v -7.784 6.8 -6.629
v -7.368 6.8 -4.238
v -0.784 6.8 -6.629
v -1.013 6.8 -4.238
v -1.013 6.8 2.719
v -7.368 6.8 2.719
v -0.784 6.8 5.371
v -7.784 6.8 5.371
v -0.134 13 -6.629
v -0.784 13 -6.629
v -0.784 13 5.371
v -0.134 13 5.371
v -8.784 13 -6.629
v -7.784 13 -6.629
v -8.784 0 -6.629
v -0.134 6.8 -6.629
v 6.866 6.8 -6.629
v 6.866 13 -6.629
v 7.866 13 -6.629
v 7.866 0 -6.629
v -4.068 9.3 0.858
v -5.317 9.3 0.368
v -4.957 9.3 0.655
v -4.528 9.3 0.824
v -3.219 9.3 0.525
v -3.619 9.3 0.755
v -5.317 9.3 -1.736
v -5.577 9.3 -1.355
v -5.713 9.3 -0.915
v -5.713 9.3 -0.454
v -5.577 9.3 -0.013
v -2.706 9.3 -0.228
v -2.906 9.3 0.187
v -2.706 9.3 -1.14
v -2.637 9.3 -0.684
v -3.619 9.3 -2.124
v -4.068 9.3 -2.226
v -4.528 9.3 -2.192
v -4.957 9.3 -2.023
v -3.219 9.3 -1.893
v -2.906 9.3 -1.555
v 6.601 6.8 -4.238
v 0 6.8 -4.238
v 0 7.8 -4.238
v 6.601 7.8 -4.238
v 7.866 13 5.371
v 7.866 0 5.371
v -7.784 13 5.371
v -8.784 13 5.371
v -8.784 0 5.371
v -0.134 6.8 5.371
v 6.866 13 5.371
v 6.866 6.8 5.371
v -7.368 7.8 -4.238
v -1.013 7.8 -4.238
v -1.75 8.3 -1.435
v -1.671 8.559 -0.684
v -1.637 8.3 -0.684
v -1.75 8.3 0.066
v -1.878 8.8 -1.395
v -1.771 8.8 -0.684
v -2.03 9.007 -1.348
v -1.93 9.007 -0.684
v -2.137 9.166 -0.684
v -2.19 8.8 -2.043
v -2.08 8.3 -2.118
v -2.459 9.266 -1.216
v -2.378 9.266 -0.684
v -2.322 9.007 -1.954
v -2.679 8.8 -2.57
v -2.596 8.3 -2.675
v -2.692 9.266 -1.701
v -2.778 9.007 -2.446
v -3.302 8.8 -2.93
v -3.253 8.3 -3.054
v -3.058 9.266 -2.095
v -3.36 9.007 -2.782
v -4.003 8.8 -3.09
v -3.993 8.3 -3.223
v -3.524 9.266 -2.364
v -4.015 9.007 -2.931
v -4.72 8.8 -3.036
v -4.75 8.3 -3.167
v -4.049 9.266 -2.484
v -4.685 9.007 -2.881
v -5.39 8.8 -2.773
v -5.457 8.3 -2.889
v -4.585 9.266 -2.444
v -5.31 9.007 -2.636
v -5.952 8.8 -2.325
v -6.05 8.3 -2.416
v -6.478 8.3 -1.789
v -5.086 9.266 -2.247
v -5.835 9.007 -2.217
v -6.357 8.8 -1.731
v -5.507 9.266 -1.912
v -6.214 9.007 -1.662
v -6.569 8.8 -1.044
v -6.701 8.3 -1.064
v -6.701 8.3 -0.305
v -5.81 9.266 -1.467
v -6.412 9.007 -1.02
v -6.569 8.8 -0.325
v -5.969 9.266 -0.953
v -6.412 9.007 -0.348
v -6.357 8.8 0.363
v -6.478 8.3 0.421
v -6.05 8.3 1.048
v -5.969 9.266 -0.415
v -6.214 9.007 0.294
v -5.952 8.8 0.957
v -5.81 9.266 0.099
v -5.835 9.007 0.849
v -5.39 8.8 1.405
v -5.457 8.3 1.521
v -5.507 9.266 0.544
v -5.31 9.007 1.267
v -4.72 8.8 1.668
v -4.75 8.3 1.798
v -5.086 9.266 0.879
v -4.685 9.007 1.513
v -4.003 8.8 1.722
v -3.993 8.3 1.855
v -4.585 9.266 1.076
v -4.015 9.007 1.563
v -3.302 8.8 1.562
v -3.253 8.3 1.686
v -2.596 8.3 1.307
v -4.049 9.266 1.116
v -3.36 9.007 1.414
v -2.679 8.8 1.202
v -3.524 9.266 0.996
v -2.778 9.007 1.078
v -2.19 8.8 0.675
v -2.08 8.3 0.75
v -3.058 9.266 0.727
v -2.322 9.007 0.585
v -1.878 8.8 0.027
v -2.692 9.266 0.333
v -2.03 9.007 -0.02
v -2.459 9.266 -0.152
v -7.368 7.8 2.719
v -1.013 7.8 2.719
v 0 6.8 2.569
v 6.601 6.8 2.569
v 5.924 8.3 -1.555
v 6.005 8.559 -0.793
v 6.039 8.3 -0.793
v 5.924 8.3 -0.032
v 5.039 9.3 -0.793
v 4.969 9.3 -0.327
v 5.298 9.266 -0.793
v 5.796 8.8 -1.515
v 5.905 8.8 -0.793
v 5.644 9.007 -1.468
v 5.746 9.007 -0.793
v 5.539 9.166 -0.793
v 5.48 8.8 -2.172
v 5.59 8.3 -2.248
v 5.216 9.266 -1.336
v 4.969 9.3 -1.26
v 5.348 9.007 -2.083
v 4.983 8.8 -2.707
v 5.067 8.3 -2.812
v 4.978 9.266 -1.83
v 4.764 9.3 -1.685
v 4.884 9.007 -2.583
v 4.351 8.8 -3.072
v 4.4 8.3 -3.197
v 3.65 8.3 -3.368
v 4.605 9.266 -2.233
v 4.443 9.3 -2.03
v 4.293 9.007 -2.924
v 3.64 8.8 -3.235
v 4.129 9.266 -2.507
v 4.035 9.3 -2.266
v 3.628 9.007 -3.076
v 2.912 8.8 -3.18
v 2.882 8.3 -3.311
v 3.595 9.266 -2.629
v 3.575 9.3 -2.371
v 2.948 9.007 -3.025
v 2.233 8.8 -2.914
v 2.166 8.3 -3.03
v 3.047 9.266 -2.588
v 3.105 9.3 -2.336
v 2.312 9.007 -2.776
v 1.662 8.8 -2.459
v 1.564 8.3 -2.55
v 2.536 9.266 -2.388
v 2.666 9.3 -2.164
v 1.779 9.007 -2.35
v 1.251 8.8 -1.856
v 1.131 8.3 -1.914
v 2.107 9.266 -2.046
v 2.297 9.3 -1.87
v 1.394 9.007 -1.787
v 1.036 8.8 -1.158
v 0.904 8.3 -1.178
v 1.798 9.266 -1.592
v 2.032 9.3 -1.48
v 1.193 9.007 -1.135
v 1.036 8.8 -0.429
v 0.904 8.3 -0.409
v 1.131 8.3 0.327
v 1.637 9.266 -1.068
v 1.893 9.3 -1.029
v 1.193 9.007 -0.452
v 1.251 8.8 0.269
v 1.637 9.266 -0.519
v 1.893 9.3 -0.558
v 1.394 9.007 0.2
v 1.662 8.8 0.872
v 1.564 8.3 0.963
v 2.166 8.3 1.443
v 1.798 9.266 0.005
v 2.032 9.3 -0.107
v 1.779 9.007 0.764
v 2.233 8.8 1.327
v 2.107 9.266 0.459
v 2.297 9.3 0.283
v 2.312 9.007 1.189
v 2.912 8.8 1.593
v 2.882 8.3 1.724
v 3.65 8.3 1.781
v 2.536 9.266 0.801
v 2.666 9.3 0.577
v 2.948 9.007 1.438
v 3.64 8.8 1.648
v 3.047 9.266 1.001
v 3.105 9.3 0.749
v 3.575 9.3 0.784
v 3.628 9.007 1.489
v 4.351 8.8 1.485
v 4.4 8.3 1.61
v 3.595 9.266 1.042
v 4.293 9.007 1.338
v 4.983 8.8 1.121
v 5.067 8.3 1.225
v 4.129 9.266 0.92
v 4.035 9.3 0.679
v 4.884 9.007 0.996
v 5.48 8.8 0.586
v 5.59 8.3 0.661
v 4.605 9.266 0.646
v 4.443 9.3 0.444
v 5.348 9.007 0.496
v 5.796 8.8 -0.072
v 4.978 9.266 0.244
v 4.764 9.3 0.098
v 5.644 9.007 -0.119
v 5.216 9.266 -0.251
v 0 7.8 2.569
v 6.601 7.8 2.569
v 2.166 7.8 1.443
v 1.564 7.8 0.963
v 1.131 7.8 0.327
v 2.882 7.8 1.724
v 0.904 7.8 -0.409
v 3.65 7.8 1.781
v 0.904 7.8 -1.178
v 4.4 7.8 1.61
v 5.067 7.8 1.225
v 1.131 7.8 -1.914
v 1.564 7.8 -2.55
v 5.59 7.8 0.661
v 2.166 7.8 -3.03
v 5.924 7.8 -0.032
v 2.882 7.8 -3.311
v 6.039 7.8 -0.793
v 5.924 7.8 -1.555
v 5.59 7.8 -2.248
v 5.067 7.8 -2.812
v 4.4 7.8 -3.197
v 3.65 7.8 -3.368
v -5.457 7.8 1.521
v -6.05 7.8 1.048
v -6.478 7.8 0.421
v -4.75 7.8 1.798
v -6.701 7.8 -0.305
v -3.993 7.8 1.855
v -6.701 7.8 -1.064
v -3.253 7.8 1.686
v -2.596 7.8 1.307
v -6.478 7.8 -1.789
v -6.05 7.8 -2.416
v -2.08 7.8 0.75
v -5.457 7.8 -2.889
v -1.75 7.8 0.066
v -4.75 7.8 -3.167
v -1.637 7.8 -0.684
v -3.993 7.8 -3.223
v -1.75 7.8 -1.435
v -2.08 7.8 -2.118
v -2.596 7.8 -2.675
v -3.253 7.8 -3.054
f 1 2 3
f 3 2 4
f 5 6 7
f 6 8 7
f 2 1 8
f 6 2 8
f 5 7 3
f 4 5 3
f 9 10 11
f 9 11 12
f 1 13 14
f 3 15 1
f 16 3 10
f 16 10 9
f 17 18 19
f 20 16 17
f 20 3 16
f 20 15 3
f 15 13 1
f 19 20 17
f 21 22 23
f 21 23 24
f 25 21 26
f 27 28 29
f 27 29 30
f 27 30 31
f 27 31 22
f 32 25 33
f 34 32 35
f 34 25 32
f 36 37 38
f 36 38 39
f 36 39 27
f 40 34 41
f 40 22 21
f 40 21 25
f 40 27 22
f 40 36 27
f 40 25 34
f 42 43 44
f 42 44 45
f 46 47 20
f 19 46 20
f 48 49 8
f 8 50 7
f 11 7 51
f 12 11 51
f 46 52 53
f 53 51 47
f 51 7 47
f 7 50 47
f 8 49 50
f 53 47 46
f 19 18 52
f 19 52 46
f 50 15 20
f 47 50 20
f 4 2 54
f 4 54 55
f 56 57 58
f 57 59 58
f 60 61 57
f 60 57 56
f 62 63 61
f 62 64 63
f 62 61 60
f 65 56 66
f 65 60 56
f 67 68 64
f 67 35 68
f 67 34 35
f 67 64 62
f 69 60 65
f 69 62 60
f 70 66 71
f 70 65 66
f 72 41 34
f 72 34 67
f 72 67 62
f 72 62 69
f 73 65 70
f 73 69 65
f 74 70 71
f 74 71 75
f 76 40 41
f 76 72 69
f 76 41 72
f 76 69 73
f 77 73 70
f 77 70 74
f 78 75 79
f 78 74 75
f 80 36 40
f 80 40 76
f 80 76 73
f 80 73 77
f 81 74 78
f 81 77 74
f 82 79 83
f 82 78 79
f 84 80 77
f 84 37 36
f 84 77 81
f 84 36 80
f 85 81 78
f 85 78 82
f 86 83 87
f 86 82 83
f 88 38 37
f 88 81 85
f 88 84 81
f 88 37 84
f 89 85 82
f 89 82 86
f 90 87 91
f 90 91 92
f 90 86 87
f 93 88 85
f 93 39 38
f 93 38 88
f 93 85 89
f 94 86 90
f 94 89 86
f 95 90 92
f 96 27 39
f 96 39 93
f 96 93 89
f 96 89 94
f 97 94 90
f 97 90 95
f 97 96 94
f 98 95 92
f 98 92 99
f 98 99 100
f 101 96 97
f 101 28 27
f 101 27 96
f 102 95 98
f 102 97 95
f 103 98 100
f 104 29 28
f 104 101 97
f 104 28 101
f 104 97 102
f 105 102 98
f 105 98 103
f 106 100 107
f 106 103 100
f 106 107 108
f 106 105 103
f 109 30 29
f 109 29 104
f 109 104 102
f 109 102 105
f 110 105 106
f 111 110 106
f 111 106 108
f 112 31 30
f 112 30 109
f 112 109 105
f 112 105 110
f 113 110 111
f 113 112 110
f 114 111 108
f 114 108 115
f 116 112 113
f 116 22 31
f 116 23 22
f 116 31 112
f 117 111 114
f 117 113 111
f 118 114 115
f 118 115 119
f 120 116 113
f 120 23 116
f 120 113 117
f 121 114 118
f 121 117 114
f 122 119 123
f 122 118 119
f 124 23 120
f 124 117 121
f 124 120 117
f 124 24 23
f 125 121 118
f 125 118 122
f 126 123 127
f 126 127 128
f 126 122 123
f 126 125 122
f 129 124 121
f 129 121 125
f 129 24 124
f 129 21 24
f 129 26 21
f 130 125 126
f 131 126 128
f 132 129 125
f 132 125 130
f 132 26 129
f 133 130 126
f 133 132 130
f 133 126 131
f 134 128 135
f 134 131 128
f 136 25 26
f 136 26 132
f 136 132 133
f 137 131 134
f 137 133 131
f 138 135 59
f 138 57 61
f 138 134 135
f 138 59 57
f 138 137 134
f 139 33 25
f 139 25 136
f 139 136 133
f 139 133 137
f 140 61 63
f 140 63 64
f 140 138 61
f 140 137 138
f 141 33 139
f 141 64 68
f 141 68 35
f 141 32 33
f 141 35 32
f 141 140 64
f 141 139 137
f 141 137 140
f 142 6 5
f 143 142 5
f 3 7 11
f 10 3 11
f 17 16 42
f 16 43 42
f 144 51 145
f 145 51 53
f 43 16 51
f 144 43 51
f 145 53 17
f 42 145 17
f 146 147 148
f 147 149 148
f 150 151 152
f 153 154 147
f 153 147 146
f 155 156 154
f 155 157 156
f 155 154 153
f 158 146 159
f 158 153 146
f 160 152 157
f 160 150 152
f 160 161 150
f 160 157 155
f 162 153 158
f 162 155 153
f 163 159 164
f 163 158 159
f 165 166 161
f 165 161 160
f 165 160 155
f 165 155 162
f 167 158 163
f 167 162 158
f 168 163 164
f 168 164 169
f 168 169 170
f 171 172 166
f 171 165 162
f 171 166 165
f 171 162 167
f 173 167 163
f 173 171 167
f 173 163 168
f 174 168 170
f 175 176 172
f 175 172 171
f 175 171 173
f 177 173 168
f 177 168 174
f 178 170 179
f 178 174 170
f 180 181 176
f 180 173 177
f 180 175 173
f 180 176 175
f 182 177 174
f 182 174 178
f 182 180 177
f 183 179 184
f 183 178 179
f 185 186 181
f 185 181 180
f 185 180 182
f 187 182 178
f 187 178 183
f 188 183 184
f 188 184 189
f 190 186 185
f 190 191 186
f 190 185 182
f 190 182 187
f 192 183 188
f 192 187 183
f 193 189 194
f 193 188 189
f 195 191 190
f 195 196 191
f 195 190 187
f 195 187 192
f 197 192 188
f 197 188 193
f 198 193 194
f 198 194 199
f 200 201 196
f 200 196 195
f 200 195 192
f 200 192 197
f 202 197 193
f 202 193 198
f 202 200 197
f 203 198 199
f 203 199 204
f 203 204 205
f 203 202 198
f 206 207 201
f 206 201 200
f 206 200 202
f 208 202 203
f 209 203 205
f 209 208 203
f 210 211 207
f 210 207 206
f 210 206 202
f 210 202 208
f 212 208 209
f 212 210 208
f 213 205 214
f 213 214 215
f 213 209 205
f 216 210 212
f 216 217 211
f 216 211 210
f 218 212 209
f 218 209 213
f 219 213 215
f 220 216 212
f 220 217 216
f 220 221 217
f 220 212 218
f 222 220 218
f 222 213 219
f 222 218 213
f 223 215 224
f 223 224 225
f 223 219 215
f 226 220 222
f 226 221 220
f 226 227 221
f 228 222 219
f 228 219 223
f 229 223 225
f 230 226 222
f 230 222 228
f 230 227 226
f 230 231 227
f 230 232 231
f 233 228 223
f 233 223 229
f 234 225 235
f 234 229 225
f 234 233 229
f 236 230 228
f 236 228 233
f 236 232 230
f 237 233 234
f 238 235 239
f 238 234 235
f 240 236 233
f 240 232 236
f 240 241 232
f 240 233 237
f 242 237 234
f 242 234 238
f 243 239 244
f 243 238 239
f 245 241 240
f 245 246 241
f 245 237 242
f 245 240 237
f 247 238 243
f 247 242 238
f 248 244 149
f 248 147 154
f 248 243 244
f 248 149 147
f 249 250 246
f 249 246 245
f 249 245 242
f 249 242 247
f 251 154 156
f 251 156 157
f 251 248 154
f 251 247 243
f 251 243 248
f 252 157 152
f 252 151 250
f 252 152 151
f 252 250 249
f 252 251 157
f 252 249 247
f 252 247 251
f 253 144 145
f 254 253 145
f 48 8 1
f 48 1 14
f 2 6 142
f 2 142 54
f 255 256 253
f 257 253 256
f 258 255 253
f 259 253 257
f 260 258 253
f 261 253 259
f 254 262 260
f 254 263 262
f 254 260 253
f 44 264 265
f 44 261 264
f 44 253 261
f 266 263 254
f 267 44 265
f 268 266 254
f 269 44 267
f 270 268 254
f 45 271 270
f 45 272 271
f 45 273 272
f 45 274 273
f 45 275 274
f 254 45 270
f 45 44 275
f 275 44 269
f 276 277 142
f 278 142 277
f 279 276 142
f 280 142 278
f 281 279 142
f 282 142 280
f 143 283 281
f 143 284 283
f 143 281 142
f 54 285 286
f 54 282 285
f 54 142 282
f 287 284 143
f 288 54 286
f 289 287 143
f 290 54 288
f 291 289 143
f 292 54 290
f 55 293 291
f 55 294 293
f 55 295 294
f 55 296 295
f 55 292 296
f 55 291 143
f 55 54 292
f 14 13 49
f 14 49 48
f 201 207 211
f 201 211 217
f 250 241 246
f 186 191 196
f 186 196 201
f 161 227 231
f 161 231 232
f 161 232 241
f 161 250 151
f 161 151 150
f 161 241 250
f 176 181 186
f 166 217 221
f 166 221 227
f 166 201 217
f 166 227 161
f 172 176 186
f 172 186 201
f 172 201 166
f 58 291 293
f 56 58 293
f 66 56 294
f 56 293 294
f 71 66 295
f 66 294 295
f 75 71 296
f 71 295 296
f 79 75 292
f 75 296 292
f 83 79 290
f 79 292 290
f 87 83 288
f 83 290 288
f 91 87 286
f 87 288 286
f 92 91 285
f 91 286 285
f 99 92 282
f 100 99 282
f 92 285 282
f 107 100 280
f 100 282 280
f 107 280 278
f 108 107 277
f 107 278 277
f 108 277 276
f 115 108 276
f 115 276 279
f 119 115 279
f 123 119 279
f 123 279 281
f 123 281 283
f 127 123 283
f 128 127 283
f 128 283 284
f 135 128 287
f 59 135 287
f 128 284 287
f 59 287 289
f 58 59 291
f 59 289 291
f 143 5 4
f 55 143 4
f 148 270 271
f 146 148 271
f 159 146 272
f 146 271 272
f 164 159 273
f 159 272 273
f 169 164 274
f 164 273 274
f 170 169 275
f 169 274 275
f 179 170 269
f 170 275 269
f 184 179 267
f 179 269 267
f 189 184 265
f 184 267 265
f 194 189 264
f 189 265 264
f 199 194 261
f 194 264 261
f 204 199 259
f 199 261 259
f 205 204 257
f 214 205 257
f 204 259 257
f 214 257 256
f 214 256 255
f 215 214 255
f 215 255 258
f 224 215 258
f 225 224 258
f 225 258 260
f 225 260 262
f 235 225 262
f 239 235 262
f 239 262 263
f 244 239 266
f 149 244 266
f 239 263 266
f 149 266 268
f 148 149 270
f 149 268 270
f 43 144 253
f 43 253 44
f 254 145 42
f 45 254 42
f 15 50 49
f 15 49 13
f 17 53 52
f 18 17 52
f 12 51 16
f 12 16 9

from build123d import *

# Parameters (mm, degrees)
SKETCH1_W           = 16.65
SKETCH1_H           = 12
BOSS_EXTRUDE1_DEPTH = 13
SKETCH2_W           = 7
SKETCH2_H           = 10.524951481
CUT_EXTRUDE1_DEPTH  = 13
SKETCH3_W           = 6.35563947
SKETCH3_H           = 6.957033312
SKETCH3_W_2         = 6.600584973
SKETCH3_H_2         = 6.806684851
BOSS_EXTRUDE2_DEPTH = 1
SKETCH4_R           = 2.546367572
SKETCH4_R_2         = 2.582102571
BOSS_EXTRUDE3_DEPTH = 1.5
FILLET1_R           = 1


with BuildPart() as part:
    # Sketch1 → Boss-Extrude1 (new body)
    with BuildSketch(Plane(origin=(0, 0, 0), x_dir=(1, 0, 0), z_dir=(0, 1, 0))):
        with Locations((-0.458958652, 0.629402757)):
            Rectangle(SKETCH1_W, SKETCH1_H)
    extrude(amount=BOSS_EXTRUDE1_DEPTH)

    # Sketch2 → Cut-Extrude1 (cut)
    with BuildSketch(Plane.XY.offset(5.370597243)):
        with Locations((-4.283958652, 12.062475741)):
            Rectangle(SKETCH2_W, SKETCH2_H)
        with Locations((3.366041348, 12.062475741)):
            Rectangle(SKETCH2_W, SKETCH2_H)
    extrude(amount=-CUT_EXTRUDE1_DEPTH, mode=Mode.SUBTRACT)

    # Sketch3 → Boss-Extrude2 (add)
    with BuildSketch(Plane(origin=(0, 6.8, 0), x_dir=(1, 0, 0), z_dir=(0, 1, 0))):
        with Locations((-4.190334083, 0.759249154)):
            Rectangle(SKETCH3_W, SKETCH3_H)
        with Locations((3.300292487, 0.834423384)):
            Rectangle(SKETCH3_W_2, SKETCH3_H_2)
    extrude(amount=BOSS_EXTRUDE2_DEPTH)

    # Sketch4 → Boss-Extrude3 (add)
    with BuildSketch(Plane(origin=(0, 7.8, 0), x_dir=(1, 0, 0), z_dir=(0, 1, 0))):
        with Locations((-4.183500062, 0.684074924)):
            Circle(SKETCH4_R)
        with Locations((3.456935343, 0.793419259)):
            Circle(SKETCH4_R_2)
    extrude(amount=BOSS_EXTRUDE3_DEPTH)

    # Fillet1
    fillet1_edges = [part.edges().sort_by_distance(p)[0] for p in [
        (-6.729867634, 9.3, -0.684074924),
        (0.874832772, 9.3, -0.793419259),
    ]]
    fillet(fillet1_edges, radius=FILLET1_R)


solid = part.part
